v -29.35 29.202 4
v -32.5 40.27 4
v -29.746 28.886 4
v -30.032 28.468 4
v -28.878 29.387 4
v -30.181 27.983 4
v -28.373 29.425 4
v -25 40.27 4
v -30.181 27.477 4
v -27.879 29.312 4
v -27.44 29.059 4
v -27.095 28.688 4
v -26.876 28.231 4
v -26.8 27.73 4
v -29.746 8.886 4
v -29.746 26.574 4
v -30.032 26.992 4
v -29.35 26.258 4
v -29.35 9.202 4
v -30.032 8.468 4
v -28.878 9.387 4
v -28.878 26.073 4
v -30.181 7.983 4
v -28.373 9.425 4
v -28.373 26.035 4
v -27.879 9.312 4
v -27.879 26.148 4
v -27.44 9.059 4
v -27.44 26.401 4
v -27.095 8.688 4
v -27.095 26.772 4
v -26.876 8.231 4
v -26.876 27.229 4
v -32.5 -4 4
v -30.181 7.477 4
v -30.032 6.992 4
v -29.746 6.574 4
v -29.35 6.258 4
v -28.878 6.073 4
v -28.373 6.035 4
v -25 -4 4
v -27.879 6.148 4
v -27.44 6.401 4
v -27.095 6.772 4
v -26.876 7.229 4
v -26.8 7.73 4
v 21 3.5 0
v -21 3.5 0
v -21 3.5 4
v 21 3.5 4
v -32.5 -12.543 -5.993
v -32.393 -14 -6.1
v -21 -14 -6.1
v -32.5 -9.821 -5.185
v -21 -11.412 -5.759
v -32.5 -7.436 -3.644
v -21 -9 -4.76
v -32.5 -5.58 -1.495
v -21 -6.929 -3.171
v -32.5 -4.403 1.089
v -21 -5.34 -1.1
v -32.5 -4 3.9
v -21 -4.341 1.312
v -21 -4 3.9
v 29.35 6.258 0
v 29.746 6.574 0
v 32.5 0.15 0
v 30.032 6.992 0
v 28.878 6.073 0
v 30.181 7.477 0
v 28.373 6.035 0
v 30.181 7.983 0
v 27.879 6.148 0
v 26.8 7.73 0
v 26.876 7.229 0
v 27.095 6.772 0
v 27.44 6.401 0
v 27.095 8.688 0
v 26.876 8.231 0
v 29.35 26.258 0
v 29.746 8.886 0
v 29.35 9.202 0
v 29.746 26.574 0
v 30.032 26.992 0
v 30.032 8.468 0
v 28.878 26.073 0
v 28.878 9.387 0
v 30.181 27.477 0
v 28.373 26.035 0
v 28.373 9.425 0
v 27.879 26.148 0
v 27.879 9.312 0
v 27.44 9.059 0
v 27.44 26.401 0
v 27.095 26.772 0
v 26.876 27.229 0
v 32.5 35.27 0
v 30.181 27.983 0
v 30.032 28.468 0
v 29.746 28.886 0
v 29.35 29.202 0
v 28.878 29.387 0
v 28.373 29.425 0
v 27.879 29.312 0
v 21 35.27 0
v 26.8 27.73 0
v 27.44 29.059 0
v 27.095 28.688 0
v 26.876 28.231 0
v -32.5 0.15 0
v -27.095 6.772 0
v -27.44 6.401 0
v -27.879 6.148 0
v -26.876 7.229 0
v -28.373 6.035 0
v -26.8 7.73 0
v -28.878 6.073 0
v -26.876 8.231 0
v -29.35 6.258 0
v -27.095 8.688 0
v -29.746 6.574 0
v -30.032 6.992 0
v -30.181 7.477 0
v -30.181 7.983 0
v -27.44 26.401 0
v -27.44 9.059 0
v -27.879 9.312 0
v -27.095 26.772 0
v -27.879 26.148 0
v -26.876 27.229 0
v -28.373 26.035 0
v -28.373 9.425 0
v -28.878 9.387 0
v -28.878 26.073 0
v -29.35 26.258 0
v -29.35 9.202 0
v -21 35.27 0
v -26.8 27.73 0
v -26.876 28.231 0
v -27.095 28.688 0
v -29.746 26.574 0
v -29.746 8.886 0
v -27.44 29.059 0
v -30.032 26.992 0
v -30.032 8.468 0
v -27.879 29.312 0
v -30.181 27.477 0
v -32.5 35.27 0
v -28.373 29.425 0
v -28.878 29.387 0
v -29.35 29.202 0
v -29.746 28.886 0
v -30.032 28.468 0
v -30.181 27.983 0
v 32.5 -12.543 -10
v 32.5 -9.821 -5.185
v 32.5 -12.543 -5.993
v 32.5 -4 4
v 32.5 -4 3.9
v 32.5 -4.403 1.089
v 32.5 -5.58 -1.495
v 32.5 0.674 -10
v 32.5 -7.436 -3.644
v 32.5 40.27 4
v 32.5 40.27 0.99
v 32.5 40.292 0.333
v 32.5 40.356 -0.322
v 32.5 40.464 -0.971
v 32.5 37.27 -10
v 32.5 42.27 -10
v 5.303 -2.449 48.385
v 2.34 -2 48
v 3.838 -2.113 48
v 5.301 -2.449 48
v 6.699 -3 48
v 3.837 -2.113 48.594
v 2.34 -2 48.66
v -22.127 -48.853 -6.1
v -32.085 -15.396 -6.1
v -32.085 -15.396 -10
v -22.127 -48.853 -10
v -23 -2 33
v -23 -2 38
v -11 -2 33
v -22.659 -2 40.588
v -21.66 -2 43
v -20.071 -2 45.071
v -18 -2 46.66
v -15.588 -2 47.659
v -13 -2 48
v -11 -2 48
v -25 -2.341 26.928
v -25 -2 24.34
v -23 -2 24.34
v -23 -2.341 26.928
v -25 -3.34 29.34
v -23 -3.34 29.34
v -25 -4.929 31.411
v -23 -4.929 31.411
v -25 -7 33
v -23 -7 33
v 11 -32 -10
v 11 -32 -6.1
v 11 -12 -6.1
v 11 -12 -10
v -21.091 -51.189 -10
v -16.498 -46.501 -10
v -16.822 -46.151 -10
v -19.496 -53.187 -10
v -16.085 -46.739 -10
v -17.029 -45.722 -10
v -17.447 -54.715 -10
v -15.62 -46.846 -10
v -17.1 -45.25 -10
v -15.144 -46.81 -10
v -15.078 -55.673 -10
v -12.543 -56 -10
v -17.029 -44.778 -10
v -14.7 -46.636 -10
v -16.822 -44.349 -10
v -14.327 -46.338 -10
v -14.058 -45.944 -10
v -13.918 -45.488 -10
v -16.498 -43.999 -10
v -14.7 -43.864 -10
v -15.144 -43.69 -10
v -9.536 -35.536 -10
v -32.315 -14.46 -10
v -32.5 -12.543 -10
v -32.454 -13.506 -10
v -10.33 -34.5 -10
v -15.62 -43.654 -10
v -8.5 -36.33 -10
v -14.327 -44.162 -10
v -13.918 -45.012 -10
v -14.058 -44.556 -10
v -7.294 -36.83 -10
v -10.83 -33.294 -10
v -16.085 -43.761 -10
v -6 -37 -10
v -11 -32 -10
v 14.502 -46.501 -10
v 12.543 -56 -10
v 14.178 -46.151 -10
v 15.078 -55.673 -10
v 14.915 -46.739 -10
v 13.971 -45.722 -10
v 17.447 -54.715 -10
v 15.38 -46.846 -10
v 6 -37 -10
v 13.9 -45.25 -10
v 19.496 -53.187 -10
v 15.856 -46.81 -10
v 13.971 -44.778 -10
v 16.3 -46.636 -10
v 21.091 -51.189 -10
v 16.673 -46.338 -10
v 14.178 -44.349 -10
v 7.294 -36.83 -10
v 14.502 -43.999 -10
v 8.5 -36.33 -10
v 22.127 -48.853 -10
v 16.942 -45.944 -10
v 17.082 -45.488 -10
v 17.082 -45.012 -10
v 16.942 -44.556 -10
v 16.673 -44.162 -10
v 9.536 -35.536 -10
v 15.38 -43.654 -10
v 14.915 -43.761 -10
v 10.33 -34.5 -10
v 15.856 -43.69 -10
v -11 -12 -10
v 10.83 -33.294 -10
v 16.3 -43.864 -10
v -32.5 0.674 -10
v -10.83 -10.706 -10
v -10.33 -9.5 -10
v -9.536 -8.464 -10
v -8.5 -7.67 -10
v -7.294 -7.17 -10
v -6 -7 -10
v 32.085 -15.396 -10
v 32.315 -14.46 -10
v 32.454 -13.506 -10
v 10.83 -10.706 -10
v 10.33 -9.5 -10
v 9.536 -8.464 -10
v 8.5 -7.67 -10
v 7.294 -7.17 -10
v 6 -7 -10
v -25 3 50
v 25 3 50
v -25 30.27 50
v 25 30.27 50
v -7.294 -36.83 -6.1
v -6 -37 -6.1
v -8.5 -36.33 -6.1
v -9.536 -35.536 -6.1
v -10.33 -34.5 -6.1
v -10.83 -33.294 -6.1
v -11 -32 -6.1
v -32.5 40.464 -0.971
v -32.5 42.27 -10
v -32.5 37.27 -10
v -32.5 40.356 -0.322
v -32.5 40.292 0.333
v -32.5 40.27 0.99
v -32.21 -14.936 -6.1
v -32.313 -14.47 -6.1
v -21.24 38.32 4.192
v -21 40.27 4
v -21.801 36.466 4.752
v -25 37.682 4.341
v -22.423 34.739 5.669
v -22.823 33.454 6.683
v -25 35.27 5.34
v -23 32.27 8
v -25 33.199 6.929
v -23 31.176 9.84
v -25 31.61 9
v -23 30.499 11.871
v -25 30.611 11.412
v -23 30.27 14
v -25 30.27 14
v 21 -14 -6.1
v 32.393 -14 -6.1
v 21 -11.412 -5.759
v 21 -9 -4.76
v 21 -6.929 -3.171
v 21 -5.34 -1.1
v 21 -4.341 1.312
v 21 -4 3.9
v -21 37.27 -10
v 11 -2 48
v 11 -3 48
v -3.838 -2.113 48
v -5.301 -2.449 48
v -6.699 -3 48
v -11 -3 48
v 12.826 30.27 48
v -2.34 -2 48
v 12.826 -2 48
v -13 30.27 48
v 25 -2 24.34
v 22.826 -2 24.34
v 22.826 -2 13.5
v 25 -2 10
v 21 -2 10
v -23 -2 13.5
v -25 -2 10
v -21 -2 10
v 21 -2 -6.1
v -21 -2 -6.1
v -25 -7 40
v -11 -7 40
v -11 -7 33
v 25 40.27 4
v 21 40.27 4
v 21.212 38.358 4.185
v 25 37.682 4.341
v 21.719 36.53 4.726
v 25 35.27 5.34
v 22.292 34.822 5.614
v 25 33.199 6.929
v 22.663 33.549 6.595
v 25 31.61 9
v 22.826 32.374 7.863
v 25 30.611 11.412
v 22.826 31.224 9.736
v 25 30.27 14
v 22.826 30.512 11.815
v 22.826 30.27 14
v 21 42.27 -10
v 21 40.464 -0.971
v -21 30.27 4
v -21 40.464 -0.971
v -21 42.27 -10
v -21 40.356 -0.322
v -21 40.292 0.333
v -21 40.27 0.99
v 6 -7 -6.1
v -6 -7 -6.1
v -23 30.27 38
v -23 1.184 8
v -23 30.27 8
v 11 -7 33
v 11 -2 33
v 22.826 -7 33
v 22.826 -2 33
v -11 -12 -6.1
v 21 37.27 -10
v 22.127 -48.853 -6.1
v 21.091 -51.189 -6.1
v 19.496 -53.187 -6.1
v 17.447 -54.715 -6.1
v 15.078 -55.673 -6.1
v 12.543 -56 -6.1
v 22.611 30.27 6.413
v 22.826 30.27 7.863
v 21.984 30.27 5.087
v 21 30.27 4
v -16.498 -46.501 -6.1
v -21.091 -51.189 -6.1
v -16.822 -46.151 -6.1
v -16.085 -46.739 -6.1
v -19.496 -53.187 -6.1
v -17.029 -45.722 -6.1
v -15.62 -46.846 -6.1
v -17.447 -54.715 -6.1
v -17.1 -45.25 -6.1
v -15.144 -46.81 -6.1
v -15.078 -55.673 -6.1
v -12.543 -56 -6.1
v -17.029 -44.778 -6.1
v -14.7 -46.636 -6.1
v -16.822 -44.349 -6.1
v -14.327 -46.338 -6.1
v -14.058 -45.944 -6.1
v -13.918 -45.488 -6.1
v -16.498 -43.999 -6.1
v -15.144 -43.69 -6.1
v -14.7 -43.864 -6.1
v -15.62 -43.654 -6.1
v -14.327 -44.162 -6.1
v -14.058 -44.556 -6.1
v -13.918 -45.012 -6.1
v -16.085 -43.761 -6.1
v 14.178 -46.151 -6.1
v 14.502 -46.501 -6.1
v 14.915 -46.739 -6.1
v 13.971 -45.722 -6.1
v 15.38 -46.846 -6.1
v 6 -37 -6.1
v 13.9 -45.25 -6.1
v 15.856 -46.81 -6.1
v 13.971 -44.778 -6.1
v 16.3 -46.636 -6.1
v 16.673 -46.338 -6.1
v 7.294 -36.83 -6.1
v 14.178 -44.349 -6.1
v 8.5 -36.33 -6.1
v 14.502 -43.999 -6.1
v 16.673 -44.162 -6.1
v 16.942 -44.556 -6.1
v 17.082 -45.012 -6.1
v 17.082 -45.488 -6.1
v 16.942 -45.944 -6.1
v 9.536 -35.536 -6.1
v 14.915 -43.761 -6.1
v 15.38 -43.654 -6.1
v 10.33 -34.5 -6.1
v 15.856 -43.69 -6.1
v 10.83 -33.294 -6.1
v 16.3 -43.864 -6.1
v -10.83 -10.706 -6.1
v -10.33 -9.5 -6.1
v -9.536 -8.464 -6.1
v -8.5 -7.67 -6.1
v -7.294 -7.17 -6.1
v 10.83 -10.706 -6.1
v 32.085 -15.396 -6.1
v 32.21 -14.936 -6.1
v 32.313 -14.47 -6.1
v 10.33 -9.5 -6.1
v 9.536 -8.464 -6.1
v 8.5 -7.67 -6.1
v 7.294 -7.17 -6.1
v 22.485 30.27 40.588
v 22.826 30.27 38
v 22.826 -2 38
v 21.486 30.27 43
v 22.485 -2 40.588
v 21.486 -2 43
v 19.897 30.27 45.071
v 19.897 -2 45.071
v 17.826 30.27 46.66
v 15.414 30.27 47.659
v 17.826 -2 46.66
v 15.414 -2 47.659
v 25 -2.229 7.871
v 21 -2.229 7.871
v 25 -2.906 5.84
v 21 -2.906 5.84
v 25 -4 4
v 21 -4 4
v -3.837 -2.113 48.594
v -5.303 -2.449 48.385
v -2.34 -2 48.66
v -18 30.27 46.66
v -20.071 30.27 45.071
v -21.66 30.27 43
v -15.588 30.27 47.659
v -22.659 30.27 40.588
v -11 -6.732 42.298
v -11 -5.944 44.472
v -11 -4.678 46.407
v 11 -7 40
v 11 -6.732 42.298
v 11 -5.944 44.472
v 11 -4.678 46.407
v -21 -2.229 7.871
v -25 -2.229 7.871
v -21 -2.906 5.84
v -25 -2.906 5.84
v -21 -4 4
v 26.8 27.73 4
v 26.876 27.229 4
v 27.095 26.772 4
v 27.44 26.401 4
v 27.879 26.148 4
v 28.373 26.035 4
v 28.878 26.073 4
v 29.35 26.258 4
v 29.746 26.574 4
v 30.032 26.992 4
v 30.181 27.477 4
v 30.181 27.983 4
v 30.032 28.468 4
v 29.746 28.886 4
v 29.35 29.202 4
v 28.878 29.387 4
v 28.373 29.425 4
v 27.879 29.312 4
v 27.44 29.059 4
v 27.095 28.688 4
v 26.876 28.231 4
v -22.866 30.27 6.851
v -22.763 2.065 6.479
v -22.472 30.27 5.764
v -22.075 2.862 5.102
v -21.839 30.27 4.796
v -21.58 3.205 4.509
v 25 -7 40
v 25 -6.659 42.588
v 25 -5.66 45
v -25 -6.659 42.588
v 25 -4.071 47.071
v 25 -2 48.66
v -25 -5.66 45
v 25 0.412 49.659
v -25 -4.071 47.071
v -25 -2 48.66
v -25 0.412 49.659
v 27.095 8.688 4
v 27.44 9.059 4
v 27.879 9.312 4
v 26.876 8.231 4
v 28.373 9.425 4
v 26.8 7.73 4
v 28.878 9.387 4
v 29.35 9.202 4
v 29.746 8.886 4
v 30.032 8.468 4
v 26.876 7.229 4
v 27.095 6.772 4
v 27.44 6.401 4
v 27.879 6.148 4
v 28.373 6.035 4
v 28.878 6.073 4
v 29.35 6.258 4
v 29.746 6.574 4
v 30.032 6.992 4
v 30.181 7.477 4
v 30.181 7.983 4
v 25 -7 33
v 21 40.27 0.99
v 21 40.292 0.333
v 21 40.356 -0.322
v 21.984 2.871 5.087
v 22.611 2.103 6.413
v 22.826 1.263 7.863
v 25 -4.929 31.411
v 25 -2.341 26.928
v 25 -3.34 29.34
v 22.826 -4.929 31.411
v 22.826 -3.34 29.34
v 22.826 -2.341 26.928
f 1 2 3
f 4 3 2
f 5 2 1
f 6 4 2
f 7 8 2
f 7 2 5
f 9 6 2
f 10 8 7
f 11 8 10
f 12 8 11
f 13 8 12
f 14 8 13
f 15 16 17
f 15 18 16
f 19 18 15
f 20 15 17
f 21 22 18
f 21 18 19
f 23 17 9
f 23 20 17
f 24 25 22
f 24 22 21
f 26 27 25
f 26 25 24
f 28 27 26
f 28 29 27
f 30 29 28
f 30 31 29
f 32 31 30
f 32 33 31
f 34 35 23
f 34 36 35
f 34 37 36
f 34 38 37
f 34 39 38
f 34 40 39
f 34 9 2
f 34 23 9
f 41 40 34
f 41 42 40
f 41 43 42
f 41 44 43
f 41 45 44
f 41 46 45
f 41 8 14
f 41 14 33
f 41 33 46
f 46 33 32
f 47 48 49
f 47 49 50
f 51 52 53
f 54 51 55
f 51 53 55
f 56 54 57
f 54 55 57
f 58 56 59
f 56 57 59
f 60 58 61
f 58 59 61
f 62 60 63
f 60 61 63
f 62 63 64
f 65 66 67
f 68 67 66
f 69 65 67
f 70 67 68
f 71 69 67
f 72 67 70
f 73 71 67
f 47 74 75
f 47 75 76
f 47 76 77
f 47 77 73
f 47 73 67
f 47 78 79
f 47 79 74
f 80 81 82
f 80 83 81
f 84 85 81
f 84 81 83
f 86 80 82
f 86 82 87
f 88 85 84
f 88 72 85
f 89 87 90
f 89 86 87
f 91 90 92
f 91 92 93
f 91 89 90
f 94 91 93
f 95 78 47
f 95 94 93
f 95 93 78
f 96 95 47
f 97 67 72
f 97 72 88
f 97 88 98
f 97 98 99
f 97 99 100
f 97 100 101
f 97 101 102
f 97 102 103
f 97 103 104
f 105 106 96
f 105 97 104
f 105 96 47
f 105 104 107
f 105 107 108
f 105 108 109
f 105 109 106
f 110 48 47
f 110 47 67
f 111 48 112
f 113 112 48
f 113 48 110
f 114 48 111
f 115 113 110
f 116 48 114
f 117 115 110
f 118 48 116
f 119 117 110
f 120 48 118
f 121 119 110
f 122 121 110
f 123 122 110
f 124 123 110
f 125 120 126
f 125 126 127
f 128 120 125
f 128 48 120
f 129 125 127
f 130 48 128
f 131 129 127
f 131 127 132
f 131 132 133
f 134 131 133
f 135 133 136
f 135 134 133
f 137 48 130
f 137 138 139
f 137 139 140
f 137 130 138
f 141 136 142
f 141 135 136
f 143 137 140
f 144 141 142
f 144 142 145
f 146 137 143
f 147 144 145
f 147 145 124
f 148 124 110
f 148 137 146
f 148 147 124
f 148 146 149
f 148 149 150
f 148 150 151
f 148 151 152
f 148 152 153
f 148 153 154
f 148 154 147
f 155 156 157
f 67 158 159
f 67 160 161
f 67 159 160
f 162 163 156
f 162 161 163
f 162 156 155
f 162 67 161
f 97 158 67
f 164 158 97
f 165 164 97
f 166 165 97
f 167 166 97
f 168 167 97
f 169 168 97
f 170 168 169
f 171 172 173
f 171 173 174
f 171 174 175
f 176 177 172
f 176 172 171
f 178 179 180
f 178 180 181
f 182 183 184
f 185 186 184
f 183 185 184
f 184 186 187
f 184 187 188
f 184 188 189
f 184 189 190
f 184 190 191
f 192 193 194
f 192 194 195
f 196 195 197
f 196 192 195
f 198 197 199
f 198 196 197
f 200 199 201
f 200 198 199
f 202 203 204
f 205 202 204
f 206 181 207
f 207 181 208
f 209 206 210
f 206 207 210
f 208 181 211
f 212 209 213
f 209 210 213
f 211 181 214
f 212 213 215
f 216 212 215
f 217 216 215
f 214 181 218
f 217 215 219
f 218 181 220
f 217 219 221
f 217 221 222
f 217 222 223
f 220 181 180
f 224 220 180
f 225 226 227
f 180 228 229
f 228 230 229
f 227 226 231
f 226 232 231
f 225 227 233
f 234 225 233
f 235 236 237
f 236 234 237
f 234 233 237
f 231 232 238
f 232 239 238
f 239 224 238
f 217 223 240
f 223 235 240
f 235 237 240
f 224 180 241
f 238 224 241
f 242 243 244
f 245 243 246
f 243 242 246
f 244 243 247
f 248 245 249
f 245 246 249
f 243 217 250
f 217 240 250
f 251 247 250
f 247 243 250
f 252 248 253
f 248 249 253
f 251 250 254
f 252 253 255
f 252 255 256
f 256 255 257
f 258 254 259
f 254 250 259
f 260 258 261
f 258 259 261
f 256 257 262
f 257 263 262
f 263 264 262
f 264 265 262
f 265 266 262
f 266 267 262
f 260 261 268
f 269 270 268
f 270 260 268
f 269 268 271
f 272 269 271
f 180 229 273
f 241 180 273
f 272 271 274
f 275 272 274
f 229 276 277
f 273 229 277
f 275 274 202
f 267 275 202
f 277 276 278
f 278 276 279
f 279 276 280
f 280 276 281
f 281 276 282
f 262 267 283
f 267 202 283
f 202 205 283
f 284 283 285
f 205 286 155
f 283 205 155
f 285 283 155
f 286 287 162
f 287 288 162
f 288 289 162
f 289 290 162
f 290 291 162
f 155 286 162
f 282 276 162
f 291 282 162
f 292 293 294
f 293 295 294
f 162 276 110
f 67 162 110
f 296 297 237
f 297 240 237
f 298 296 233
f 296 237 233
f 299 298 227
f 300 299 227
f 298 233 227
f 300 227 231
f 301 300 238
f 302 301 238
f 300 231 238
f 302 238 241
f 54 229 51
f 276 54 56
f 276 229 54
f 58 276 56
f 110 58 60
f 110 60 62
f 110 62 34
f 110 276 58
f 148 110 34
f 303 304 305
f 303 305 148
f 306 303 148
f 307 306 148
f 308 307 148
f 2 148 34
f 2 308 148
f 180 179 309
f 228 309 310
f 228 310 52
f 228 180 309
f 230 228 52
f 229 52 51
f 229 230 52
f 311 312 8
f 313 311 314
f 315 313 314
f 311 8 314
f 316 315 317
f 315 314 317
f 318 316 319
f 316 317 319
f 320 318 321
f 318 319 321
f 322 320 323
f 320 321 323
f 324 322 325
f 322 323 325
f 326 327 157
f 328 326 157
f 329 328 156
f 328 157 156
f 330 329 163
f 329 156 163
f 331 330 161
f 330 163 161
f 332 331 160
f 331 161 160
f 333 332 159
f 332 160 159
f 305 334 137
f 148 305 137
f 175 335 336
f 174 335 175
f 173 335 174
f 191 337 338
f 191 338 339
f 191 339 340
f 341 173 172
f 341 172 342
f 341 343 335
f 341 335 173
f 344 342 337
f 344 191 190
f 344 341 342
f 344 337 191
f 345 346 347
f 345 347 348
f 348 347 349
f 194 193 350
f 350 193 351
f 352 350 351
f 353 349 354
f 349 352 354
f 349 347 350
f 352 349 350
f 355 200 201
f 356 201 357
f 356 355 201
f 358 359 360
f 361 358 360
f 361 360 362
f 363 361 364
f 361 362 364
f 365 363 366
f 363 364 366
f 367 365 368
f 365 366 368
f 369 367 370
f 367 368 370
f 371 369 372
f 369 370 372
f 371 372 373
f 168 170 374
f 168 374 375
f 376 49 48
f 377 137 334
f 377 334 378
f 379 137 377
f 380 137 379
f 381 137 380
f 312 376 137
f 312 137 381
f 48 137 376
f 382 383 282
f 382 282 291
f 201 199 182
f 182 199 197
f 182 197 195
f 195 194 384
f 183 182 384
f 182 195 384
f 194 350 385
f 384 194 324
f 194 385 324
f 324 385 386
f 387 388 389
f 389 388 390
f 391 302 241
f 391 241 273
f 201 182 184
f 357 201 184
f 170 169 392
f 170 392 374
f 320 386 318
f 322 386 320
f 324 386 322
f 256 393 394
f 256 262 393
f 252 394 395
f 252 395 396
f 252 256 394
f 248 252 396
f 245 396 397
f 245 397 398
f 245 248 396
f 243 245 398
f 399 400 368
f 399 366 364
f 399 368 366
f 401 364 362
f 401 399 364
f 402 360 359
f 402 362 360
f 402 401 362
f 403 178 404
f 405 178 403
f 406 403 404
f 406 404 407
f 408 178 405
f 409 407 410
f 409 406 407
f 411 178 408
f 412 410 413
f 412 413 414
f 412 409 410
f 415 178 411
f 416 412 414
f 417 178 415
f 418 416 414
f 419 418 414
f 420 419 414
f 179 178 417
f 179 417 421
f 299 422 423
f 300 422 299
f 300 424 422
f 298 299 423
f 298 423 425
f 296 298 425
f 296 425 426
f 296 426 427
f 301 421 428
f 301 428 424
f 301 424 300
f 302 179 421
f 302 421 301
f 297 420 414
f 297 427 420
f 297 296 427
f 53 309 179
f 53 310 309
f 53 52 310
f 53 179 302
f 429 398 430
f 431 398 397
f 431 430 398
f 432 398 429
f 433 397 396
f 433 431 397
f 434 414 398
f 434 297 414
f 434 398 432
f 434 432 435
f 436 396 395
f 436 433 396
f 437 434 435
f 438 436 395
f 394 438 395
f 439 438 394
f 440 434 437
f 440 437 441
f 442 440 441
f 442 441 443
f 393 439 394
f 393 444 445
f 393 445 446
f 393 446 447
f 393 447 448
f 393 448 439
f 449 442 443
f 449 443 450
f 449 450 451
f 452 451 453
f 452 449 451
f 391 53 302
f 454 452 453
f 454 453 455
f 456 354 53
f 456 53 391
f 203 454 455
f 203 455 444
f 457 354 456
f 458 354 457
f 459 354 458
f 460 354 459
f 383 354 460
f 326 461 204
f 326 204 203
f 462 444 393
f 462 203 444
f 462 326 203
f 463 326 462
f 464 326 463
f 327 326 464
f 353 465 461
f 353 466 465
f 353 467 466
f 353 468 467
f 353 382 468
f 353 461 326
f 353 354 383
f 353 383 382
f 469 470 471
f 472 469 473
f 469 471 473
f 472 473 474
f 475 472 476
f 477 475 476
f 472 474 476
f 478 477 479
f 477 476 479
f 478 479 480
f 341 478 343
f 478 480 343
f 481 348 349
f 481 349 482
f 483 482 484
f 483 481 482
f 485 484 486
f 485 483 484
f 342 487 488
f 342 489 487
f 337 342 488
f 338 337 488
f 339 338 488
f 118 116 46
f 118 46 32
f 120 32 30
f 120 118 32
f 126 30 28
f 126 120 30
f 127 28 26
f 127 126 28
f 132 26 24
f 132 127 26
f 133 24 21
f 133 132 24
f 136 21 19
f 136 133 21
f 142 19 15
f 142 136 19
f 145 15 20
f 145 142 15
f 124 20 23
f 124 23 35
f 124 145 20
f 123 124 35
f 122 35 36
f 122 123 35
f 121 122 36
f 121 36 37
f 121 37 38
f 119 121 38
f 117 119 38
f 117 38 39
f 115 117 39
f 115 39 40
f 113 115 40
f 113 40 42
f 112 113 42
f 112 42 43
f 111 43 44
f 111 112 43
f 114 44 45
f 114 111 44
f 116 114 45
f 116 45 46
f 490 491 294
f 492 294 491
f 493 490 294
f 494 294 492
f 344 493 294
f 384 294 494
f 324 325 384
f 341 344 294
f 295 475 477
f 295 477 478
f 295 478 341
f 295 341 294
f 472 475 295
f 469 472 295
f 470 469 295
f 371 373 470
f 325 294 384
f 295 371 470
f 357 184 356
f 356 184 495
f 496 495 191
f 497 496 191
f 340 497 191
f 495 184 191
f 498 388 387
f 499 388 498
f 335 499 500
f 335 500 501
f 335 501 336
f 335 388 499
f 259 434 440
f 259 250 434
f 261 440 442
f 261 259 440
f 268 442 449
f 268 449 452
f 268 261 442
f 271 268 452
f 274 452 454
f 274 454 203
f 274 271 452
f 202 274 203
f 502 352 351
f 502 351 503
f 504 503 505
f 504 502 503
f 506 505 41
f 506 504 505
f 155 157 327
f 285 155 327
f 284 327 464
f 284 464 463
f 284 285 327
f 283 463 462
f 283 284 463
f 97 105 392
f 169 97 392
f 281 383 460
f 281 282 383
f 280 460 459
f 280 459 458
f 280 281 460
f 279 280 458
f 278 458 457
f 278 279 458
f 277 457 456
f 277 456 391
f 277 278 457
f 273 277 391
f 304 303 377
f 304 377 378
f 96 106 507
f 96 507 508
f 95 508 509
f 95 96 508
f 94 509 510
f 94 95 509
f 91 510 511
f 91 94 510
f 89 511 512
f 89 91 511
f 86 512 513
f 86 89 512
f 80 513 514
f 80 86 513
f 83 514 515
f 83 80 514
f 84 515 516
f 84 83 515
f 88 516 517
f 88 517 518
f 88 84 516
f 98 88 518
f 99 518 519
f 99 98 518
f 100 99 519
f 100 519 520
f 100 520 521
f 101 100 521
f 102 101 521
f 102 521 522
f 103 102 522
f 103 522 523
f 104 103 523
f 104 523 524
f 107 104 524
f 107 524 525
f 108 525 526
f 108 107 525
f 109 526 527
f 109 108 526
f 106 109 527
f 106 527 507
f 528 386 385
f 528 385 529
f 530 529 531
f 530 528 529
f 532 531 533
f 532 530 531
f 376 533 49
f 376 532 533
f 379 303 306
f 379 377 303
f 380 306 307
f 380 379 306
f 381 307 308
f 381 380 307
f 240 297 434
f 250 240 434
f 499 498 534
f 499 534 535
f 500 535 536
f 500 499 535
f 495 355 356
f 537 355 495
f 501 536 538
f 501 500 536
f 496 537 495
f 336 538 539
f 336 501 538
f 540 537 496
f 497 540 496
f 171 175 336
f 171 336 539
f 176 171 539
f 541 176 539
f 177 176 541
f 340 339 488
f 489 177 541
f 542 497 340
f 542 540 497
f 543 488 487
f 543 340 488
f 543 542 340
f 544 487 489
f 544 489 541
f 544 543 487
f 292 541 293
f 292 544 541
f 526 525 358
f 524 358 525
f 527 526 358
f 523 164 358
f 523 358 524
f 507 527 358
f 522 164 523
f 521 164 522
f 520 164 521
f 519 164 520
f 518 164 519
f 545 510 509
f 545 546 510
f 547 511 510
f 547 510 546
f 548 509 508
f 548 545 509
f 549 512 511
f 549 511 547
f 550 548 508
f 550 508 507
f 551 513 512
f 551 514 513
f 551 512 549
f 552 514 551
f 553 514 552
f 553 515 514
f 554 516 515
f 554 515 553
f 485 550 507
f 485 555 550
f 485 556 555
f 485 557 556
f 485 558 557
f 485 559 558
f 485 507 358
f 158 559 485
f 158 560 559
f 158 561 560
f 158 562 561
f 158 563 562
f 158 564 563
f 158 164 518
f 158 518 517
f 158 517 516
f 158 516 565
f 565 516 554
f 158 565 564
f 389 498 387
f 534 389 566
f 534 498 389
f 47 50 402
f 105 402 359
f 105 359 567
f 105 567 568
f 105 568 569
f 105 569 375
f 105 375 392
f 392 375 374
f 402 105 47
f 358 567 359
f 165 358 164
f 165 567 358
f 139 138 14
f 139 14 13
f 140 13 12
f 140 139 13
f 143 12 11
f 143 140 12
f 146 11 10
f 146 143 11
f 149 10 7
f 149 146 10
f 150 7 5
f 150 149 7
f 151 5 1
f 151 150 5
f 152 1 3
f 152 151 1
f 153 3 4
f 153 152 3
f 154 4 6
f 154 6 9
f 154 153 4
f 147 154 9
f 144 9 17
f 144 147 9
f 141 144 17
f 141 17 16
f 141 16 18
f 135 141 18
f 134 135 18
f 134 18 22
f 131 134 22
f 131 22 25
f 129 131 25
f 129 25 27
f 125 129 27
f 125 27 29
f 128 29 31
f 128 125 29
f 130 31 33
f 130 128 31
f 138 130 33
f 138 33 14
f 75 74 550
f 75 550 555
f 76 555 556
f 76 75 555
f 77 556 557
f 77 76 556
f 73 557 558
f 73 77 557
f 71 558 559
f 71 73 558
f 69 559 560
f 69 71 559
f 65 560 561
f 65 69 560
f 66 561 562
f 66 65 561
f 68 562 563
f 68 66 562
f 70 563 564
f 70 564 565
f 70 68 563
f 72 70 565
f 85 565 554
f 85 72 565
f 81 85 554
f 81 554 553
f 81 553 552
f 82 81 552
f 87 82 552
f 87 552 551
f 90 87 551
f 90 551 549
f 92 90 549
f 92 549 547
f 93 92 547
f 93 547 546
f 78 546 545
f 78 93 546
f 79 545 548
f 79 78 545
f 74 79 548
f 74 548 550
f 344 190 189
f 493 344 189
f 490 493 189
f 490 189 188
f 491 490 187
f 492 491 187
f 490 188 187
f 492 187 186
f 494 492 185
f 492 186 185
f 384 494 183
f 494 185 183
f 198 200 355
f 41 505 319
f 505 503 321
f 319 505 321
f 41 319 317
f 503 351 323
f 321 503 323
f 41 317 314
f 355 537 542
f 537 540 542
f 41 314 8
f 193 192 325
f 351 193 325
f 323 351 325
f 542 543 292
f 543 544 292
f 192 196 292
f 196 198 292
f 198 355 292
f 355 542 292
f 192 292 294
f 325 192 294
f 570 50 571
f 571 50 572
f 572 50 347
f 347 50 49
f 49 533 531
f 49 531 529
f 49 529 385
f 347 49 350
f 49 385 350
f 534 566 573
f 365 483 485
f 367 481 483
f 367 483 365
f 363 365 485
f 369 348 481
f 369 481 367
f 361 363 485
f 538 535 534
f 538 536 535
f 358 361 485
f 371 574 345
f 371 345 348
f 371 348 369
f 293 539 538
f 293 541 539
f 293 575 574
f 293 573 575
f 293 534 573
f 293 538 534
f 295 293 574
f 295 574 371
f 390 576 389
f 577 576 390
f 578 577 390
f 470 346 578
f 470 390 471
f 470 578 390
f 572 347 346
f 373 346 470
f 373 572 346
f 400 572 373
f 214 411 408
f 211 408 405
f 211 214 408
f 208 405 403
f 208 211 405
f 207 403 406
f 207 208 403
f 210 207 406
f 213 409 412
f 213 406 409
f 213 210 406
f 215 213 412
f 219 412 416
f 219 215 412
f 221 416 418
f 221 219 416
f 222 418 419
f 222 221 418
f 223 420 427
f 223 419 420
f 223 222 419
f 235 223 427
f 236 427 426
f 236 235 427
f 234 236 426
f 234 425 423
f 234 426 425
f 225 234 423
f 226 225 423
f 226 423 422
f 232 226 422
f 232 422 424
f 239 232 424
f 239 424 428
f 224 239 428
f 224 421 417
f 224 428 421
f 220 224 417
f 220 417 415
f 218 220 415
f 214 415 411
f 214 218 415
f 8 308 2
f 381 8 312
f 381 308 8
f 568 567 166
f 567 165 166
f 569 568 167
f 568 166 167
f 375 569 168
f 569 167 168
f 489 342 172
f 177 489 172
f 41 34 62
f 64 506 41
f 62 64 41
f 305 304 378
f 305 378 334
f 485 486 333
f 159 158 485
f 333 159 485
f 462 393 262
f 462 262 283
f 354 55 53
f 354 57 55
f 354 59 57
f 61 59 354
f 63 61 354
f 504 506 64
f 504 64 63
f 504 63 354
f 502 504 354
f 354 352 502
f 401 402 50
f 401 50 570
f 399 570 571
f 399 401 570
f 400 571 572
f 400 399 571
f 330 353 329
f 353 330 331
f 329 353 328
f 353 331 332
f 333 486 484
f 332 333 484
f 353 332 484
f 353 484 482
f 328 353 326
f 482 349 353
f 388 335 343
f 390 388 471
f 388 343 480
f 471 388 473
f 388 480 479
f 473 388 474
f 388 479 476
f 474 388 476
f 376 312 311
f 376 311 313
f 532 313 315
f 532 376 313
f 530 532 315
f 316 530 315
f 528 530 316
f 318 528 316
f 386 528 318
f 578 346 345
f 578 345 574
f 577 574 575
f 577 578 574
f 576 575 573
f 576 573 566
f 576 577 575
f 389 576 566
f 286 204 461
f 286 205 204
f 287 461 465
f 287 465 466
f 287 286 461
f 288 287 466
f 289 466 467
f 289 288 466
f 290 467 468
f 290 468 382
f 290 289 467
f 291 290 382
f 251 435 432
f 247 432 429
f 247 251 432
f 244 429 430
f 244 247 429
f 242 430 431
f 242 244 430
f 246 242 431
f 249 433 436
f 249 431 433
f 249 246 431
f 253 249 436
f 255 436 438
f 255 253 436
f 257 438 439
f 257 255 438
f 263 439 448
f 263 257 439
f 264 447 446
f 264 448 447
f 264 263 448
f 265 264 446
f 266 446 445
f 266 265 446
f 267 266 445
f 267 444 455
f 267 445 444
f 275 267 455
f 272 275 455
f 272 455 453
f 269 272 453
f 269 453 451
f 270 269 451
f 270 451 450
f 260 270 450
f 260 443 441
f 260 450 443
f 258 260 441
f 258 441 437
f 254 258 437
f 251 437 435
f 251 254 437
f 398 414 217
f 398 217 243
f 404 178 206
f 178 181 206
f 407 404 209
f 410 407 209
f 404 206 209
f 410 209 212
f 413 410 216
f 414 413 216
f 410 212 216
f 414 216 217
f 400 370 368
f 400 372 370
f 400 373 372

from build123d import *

# Parameters (mm, degrees)
SKETCH1_R            = 1.7
BOSS_EXTRUDE1_DEPTH  = 4
BOSS_EXTRUDE7_DEPTH  = 65
SKETCH9_W            = 42
SKETCH9_H            = 10.1
CUT_EXTRUDE2_DEPTH   = 2
SKETCH4_W            = 65
SKETCH4_H            = 3.9
BOSS_EXTRUDE3_DEPTH  = 52
SKETCH5_R            = 1.6
CUT_EXTRUDE1_DEPTH   = 50
BOSS_EXTRUDE8_START  = -10
BOSS_EXTRUDE8_DEPTH  = 32.27
FILLET1_R            = 10
BOSS_EXTRUDE9_DEPTH  = 11.5
BOSS_EXTRUDE12_START = -65
BOSS_EXTRUDE12_DEPTH = 11.5
FILLET5_R            = 10
SKETCH14_W           = 12
SKETCH14_H           = 15
SKETCH14_W_2         = 11.826086957
BOSS_EXTRUDE10_DEPTH = 5
FILLET3_R            = 10
SKETCH15_W           = 22
SKETCH15_H           = 30
CUT_EXTRUDE3_DEPTH   = 10
FILLET6_R            = 5
FILLET7_R            = 10
BOSS_EXTRUDE13_REACH = 95.361
FILLET8_R            = 10
FILLET9_R            = 5
FILLET10_START       = -2
FILLET10_DEPTH       = 32.27
FILLET10_START_2     = -32.5
FILLET10_2_DEPTH     = 65
FILLET10_START_3     = 20.99999979
FILLET10_3_DEPTH     = 4.00000021
FILLET10_START_4     = -25
FILLET10_4_DEPTH     = 4
FILLET10_START_5     = 30.27
FILLET10_5_DEPTH     = 12.000012257


with BuildPart() as part:
    # Sketch1 → Boss-Extrude1 (new body)
    with BuildSketch(Plane.XY):
        Polygon((-21, 40.27), (-21, 3.5), (21, 3.5), (21, 40.27), (32.5, 40.27), (32.5, 0), (-32.5, 0), (-32.5, 40.27), align=None)
        with Locations((-28.5, 27.73)):
            Circle(SKETCH1_R, mode=Mode.SUBTRACT)
        with Locations((-28.5, 7.73)):
            Circle(SKETCH1_R, mode=Mode.SUBTRACT)
        with Locations(Location((28.5, 7.73, 0), (0, 0, 180))):
            Circle(SKETCH1_R, mode=Mode.SUBTRACT)
        with Locations(Location((28.5, 27.73, 0), (0, 0, 180))):
            Circle(SKETCH1_R, mode=Mode.SUBTRACT)
    extrude(amount=BOSS_EXTRUDE1_DEPTH)

    # Sketch7 → Boss-Extrude7 (add)
    with BuildSketch(Plane(origin=(32.5, 0, 0), x_dir=(0, 0, -1), z_dir=(1, 0, 0))):
        Polygon((0, 0), (-4, 0), (-4, -4), (10, -4), (10, 0.674077793), (0, 0.15), align=None)
    extrude(amount=-BOSS_EXTRUDE7_DEPTH)

    # Sketch9 → Cut-Extrude2 (cut)
    with BuildSketch(Plane.XZ.offset(4)):
        with Locations((0, -1.05)):
            Rectangle(SKETCH9_W, SKETCH9_H)
    extrude(amount=-CUT_EXTRUDE2_DEPTH, mode=Mode.SUBTRACT)

    # Sketch4 → Boss-Extrude3 (add)
    with BuildSketch(Plane.XZ.offset(4)):
        with Locations((0, -8.05)):
            Rectangle(SKETCH4_W, SKETCH4_H)
    extrude(amount=BOSS_EXTRUDE3_DEPTH)

    # Sketch5 → Cut-Extrude1 (cut)
    with BuildSketch(Plane.XY.offset(-10)):
        with Locations(Location((-15.5, -45.25, 0), (0, 0, 180))):
            Circle(SKETCH5_R)
        with Locations(Location((15.5, -45.25, 0), (0, 0, 180))):
            Circle(SKETCH5_R)
    extrude(amount=CUT_EXTRUDE1_DEPTH, mode=Mode.SUBTRACT)

    # Sketch11 → Boss-Extrude8 (add)
    with BuildSketch(Plane(origin=(0, 40.27, 0), x_dir=(1, 0, 0), z_dir=(0, 1, 0)).offset(BOSS_EXTRUDE8_START)):
        Polygon((-23, -4), (-25, -4), (-25, -50), (25, -50), (25, -4), (22.826086957, -4), (22.826086957, -48), (-23, -48), align=None)
    extrude(amount=-BOSS_EXTRUDE8_DEPTH)

    # Fillet1
    fillet1_edges = [part.edges().sort_by_distance(p)[0] for p in [
        (-26.75, -4, -6.1),
        (26.75, -4, -6.1),
    ]]
    fillet(fillet1_edges, radius=FILLET1_R)

    # Sketch13 → Boss-Extrude9 (add)
    with BuildSketch(Plane(origin=(32.5, 0, 0), x_dir=(0, 0, -1), z_dir=(1, 0, 0))):
        Polygon((10, 42.270012257), (0, 40.27), (0, 35.27), (10, 37.270012257), align=None)
    extrude(amount=-BOSS_EXTRUDE9_DEPTH)

    # Sketch13<8> → Boss-Extrude12 (add)
    with BuildSketch(Plane(origin=(32.5, 0, 0), x_dir=(0, 0, -1), z_dir=(1, 0, 0)).offset(BOSS_EXTRUDE12_START)):
        Polygon((0, 40.27), (10, 42.270012257), (10, 37.270012257), (0, 35.27), align=None)
    extrude(amount=BOSS_EXTRUDE12_DEPTH)

    # Fillet5
    fillet5_edges = [part.edges().sort_by_distance(p)[0] for p in [
        (-26.75, 40.27, 0),
        (26.75, 40.27, 0),
    ]]
    fillet(fillet5_edges, radius=FILLET5_R)

    # Sketch14 → Boss-Extrude10 (add)
    with BuildSketch(Plane.XZ.offset(2)):
        with Locations((-17, 40.5)):
            Rectangle(SKETCH14_W, SKETCH14_H)
        with Locations((16.913043479, 40.5)):
            Rectangle(SKETCH14_W_2, SKETCH14_H)
        Polygon((25, 50), (11, 50), (11, 48), (22.826086957, 48), (22.826086957, 33), (25, 33), align=None)
        Polygon((-11, 50), (-25, 50), (-25, 33), (-23, 33), (-23, 48), (-11, 48), align=None)
    extrude(amount=BOSS_EXTRUDE10_DEPTH)

    # Fillet3
    # the kernel refuses this fillet: 10 mm, written as the material it adds along each edge
    with BuildSketch(Plane(origin=(22.826086957, -2, 33), x_dir=(0, -1, 0), z_dir=(1, 0, 0))) as fillet3_piece_1:
        with BuildLine():
            CenterArc((10, 8.660254038), FILLET3_R, 180, 60)
            Line((0, 8.660254038), (0, 0))
            Line((0, 0), (5, 0))
        make_face()
    extrude(amount=2.173913043)
    with BuildSketch(Plane(origin=(-25, -2, 33), x_dir=(0, -1, 0), z_dir=(1, 0, 0)), Plane(origin=(11, -2, 50), x_dir=(0, -1, 0), z_dir=(0, 0, -1))) as fillet3_piece_2:
        with BuildLine():
            CenterArc((10, 8.660254038), FILLET3_R, 180, 60)
            Line((0, 8.660254038), (0, 0))
            Line((0, 0), (5, 0))
        make_face()
    extrude(amount=2)
    with BuildSketch(Plane(origin=(-11, -2, 48), x_dir=(1, 0, 0), z_dir=(0, 0, 1))) as fillet3_piece_3:
        with BuildLine():
            CenterArc((8.660254038, -10), FILLET3_R, 90, 60)
            Line((0, -5), (0, 0))
            Line((0, 0), (8.660254038, 0))
        make_face()
    extrude(amount=2)

    # Sketch15 → Cut-Extrude3 (cut)
    with BuildSketch(Plane.XY.offset(-6.1)):
        with Locations((0, -22)):
            Rectangle(SKETCH15_W, SKETCH15_H)
        Polygon((-32.5, -14), (-20, -56), (-32.5, -56), align=None)
        Polygon((32.5, -56), (20, -56), (32.5, -14), align=None)
    extrude(amount=-CUT_EXTRUDE3_DEPTH, mode=Mode.SUBTRACT)

    # Fillet6
    fillet6_edges = [part.edges().sort_by_distance(p)[0] for p in [
        (-11, -37, -8.05),
        (-11, -7, -8.05),
        (11, -7, -8.05),
        (11, -37, -8.05),
    ]]
    fillet(fillet6_edges, radius=FILLET6_R)

    # Fillet7
    fillet7_edges = [part.edges().sort_by_distance(p)[0] for p in [
        (-20, -56, -8.05),
        (-32.5, -14, -8.05),
        (32.5, -14, -8.05),
        (20, -56, -8.05),
    ]]
    fillet(fillet7_edges, radius=FILLET7_R)

    # Boss-Extrude13: up to this face of the body (flat: up to its plane)
    boss_extrude13_end = Plane(part.part.faces().sort_by_distance((22.826086957, 13.980833311, 26.043580166))[0])
    # Sketch16 → Boss-Extrude13 (add, up to the picked face)
    with BuildSketch(Plane(origin=(-23, 0, 0), x_dir=(0, 0, -1), z_dir=(1, 0, 0)), mode=Mode.PRIVATE) as boss_extrude13_sk1:
        Polygon((-4, -2), (-4, 3.5), (-13.5, -2), align=None)
    boss_extrude13_tool1 = split(extrude(boss_extrude13_sk1.sketch, amount=BOSS_EXTRUDE13_REACH, mode=Mode.PRIVATE), bisect_by=boss_extrude13_end, keep=Keep.BOTH, mode=Mode.PRIVATE)
    add(boss_extrude13_tool1.solids().sort_by(Axis((-23, -0.166667, 7.166667), (1, 0, 0)))[0])

    # Fillet8
    # the kernel refuses this fillet: 10 mm, written as the material it adds along each edge
    with BuildSketch(Plane(origin=(-21, -2, 4), x_dir=(0, -1, 0), z_dir=(-1, 0, 0)), Plane(origin=(25, -2, 4), x_dir=(0, -1, 0), z_dir=(-1, 0, 0))) as fillet8_piece_1:
        with BuildLine():
            CenterArc((10, 6), FILLET8_R, 180, 36.869897646)
            Line((0, 6), (-0.2, 6))
            Line((-0.2, 6), (-0.2, 0))
            Line((-0.2, 0), (0, -0.2))
            ThreePointArc((0, -0.2), (1, -0.2), (1.84, -0.12))
            Line((1.84, -0.12), (2, 0))
        make_face()
    extrude(amount=4)

    # Fillet9
    # the kernel refuses this fillet: 5 mm, written as the material it adds along each edge
    with BuildSketch(Plane(origin=(22.826086957, 30.27, 4), x_dir=(-1, 0, 0), z_dir=(0, -1, 0))) as fillet9_piece_1_section:
        with BuildLine():
            CenterArc((5, -3.863453894), FILLET9_R, 129.403862825, 50.596137175)
            Line((0, -3.863453894), (0, 0))
            Line((0, 0), (1.826086957, 0))
        make_face()
    fillet9_piece_1 = extrude(amount=36.428634735, mode=Mode.PRIVATE)
    fillet9_piece_1 = split(fillet9_piece_1, bisect_by=Plane(origin=(22.826086957, -2, 4), z_dir=(0, 1, 0)), keep=Keep.TOP, mode=Mode.PRIVATE)
    add(fillet9_piece_1)
    with BuildSketch(Plane(origin=(-23, 30.27, 4), x_dir=(0, 0, 1), z_dir=(0, -1, 0))) as fillet9_piece_2_section:
        with BuildLine():
            CenterArc((4, -5), FILLET9_R, 90, 53.130102354)
            Line((0, -2), (0, 0))
            Line((0, 0), (4, 0))
        make_face()
    fillet9_piece_2 = extrude(amount=36.77, mode=Mode.PRIVATE)
    fillet9_piece_2 = split(fillet9_piece_2, bisect_by=Plane(origin=(-23, -2, 4), z_dir=(0, 1, 0)), keep=Keep.TOP, mode=Mode.PRIVATE)
    add(fillet9_piece_2)

    # Fillet10: read off the stored shape, not the designer's step
    # Fillet10 outline → Fillet10 (add)
    with BuildSketch(Plane(origin=(0, 0, 0), x_dir=(1, 0, 0), z_dir=(0, 1, 0)).offset(FILLET10_START)):
        with BuildLine():
            Line((-23, -48), (-13, -48))
            ThreePointArc((-13, -48), (-20.071067812, -45.071067812), (-23, -38))
            Line((-23, -38), (-23, -48))
        make_face()
        with BuildLine():
            ThreePointArc((22.826086957, -38), (19.897154769, -45.071067812), (12.826086957, -48))
            Line((12.826086957, -48), (22.826086957, -48))
            Line((22.826086957, -48), (22.826086957, -38))
        make_face()
    extrude(amount=FILLET10_DEPTH)

    # Fillet10 2 outline → Fillet10 2 (cut)
    with BuildSketch(Plane.YZ.offset(FILLET10_START_2)):
        with BuildLine():
            ThreePointArc((-7, 40), (-4.071067812, 47.071067812), (3, 50))
            Line((3, 50), (-7, 50))
            Line((-7, 50), (-7, 40))
        make_face()
    extrude(amount=FILLET10_2_DEPTH, mode=Mode.SUBTRACT)

    # Fillet10 3 outline → Fillet10 3 (add)
    with BuildSketch(Plane.YZ.offset(FILLET10_START_3)):
        with BuildLine():
            ThreePointArc((40.27, 4), (33.198932188, 6.928932188), (30.27, 14))
            Line((30.27, 14), (30.27, 4))
            Line((30.27, 4), (40.27, 4))
        make_face()
    extrude(amount=FILLET10_3_DEPTH)

    # Fillet10 4 outline → Fillet10 4 (add)
    with BuildSketch(Plane.YZ.offset(FILLET10_START_4)):
        with BuildLine():
            ThreePointArc((40.27, 4), (33.198932188, 6.928932188), (30.27, 14))
            Line((30.27, 14), (30.27, 4))
            Line((30.27, 4), (40.27, 4))
        make_face()
    extrude(amount=FILLET10_4_DEPTH)

    # Fillet10 5 outline → Fillet10 5 (cut)
    with BuildSketch(Plane(origin=(0, 0, 0), x_dir=(1, 0, 0), z_dir=(0, 1, 0)).offset(FILLET10_START_5)):
        with BuildLine():
            ThreePointArc((22.826086957, -7.863453894), (22.346570275, -5.726813876), (20.999994729, -3.99999567))
            Line((20.999994729, -3.99999567), (20.99999979, -14))
            Line((20.99999979, -14), (20.99999979, -15))
            Line((20.99999979, -15), (22.826086959, -15))
            Line((22.826086959, -15), (22.826086957, -7.863453894))
        make_face()
        with BuildLine():
            Line((-22.999999999, -15), (-21, -15))
            Line((-21, -15), (-21, -14))
            Line((-21, -14), (-20.9999923, -3.999994225))
            ThreePointArc((-20.9999923, -3.999994225), (-22.472133803, -5.763927718), (-23, -8))
            Line((-23, -8), (-22.999999999, -15))
        make_face()
    extrude(amount=FILLET10_5_DEPTH, mode=Mode.SUBTRACT)


solid = part.part
